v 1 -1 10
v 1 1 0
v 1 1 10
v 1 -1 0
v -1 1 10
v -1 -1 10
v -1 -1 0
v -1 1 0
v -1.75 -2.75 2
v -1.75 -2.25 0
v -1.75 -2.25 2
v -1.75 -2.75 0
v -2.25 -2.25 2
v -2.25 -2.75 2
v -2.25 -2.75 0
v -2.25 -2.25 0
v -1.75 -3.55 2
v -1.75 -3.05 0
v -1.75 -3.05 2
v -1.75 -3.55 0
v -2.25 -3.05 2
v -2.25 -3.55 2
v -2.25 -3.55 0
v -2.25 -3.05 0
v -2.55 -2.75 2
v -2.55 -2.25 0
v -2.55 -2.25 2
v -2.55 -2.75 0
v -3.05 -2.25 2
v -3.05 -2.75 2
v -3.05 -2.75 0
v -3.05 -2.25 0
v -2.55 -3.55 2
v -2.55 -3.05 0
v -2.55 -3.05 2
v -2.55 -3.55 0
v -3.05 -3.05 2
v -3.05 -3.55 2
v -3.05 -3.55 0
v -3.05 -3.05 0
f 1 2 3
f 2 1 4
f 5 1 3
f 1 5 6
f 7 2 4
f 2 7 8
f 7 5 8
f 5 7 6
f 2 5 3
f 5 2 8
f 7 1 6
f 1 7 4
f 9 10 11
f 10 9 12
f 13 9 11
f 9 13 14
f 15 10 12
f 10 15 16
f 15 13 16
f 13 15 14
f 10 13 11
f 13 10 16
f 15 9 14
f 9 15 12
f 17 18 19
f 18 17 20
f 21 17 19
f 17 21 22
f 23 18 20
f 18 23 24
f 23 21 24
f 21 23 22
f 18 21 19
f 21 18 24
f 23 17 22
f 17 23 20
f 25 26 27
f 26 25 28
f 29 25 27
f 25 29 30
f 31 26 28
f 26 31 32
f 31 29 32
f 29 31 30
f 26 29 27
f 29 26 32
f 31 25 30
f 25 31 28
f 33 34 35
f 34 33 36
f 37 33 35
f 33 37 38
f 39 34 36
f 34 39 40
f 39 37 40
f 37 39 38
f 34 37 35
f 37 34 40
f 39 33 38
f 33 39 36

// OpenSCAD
translate([0, 0, 5]) color([0,1,0,0.9]) cube([2, 2, 10], center=true);
translate([-2, -2.5, 1]) color([1,0,0]) cube([0.5, 0.5, 2], center=true);
translate([-2, -3.3, 1]) color([1,0,0]) cube([0.5, 0.5, 2], center=true);
translate([-2.8, -2.5, 1]) color([1,0,0]) cube([0.5, 0.5, 2], center=true);
translate([-2.8, -3.3, 1]) color([1,0,0]) cube([0.5, 0.5, 2], center=true);
